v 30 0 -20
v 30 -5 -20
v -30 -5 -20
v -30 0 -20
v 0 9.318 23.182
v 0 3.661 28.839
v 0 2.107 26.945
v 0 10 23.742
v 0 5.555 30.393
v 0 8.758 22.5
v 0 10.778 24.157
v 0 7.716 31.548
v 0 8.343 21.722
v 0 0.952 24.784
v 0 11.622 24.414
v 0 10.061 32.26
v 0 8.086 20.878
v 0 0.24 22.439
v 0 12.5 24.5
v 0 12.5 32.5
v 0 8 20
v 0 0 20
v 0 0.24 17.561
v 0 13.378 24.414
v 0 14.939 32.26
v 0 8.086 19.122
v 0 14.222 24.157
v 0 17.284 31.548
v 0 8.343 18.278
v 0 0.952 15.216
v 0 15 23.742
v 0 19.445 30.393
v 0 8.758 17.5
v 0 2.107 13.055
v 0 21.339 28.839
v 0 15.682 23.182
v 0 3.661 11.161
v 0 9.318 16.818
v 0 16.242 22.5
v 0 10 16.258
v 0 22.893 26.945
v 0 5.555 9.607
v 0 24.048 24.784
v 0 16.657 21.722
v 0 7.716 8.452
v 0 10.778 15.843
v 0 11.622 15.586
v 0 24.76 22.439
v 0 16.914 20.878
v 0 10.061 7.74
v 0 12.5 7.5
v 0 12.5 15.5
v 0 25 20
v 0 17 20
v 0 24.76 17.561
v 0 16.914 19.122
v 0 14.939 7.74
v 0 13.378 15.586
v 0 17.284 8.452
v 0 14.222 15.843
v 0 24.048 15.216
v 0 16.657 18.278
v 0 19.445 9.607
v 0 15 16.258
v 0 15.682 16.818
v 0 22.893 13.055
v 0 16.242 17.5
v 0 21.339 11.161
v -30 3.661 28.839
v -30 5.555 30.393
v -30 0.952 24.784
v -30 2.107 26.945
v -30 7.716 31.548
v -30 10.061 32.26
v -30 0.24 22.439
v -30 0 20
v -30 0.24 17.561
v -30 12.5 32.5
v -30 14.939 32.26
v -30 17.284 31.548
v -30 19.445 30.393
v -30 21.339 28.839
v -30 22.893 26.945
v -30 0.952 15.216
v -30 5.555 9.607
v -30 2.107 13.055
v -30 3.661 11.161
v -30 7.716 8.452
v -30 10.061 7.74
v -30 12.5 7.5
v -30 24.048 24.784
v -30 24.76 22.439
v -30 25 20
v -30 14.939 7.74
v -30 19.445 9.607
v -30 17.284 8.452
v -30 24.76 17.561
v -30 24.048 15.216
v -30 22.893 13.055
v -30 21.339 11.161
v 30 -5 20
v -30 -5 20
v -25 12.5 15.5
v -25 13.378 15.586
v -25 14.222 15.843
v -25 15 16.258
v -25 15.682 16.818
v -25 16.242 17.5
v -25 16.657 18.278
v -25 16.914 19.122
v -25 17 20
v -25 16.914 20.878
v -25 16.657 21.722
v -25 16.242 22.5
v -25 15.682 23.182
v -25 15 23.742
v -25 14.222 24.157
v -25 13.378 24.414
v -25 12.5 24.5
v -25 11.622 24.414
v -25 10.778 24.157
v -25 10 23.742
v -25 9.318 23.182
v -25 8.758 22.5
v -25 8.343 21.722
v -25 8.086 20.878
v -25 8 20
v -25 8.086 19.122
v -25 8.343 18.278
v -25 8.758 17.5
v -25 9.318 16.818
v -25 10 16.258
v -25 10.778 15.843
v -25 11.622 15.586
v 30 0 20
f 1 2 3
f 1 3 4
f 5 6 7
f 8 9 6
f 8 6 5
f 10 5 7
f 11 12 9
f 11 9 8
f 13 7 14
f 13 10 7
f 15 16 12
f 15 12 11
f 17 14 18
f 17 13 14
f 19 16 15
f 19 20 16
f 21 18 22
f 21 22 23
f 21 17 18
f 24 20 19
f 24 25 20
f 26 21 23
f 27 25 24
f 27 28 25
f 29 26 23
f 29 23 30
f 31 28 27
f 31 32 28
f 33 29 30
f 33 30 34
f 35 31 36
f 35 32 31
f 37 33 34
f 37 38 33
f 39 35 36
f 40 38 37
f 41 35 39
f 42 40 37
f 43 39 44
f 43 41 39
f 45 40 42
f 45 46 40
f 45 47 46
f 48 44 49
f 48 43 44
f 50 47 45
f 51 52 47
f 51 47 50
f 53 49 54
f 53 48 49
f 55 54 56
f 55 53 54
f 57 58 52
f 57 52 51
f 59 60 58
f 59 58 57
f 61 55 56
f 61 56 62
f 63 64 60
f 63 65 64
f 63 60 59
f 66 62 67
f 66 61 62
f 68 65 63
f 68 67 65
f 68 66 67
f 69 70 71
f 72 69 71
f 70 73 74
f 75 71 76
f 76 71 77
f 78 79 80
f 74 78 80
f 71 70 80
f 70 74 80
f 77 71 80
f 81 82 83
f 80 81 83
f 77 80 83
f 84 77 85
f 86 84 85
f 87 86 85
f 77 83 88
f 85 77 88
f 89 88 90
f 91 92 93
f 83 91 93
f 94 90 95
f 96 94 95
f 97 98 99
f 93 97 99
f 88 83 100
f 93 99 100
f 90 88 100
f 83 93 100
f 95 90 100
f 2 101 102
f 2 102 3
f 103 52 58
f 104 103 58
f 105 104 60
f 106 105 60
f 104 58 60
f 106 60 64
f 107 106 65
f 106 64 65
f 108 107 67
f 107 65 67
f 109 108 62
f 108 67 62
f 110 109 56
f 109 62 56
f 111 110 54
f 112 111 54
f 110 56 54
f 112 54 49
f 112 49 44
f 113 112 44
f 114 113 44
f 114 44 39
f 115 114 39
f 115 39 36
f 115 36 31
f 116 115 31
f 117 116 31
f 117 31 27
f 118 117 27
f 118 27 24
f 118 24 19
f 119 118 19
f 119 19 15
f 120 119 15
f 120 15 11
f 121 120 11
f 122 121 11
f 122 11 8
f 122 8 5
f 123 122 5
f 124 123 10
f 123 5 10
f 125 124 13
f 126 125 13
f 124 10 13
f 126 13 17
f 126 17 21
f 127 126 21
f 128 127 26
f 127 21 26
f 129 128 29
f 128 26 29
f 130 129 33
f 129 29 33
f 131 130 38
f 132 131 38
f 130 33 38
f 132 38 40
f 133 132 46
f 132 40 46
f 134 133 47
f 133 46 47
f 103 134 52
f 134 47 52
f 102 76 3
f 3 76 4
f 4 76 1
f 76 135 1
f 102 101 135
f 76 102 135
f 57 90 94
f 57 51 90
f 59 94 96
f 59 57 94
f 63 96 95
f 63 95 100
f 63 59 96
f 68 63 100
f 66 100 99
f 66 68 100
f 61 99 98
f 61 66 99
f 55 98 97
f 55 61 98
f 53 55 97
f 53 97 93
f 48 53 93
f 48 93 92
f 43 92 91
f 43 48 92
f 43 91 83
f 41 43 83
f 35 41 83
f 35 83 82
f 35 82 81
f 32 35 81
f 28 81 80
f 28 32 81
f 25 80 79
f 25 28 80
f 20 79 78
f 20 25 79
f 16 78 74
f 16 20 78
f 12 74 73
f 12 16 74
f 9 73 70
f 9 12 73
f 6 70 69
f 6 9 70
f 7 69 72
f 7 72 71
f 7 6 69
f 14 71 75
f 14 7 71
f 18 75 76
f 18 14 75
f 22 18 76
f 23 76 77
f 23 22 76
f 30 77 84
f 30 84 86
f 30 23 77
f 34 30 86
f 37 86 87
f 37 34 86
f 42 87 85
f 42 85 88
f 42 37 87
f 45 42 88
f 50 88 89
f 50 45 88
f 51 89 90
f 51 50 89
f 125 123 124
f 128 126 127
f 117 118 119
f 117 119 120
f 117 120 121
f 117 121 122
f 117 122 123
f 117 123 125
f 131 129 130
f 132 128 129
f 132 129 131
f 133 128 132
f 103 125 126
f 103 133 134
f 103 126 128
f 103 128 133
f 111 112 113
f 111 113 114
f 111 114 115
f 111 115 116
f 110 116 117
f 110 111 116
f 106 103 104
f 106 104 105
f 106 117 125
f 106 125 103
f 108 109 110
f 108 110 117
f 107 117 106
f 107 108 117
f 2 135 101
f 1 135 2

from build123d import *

# Parameters (mm, degrees)
SKETCH_4_W       = 40
SKETCH_4_H       = 5
EXTRUDE_5_DEPTH  = 30
SKETCH_9_R       = 12.5
SKETCH_9_R_2     = 4.5
EXTRUDE_8_DEPTH  = 30
EXTRUDE_START    = -30
SKETCH_9_2_R     = 12.5
EXTRUDE_10_DEPTH = 5


with BuildPart() as part:
    # Эскиз4 → Бобышка-Вытянуть5 (new, symmetric)
    with BuildSketch(Plane(origin=(0, 0, 0), x_dir=(0, 0, -1), z_dir=(1, 0, 0))):
        with Locations((0, -2.5)):
            Rectangle(SKETCH_4_W, SKETCH_4_H)
    extrude(amount=EXTRUDE_5_DEPTH, both=True)


with BuildPart() as body_2:
    # Эскиз9 → Вытянуть-Тонкостенный8 (new body)
    with BuildSketch(Plane(origin=(0, 0, 0), x_dir=(0, 0, -1), z_dir=(1, 0, 0))):
        with Locations((-20, 12.5)):
            Circle(SKETCH_9_R)
        with Locations((-20, 12.5)):
            Circle(SKETCH_9_R_2, mode=Mode.SUBTRACT)
    extrude(amount=-EXTRUDE_8_DEPTH)

    # Эскиз9<2> → Бобышка-Вытянуть10 (add)
    with BuildSketch(Plane(origin=(0, 0, 0), x_dir=(0, 0, -1), z_dir=(1, 0, 0)).offset(EXTRUDE_START)):
        with Locations((-20, 12.5)):
            Circle(SKETCH_9_2_R)
    extrude(amount=EXTRUDE_10_DEPTH)


solid = Compound([part.part, body_2.part])
